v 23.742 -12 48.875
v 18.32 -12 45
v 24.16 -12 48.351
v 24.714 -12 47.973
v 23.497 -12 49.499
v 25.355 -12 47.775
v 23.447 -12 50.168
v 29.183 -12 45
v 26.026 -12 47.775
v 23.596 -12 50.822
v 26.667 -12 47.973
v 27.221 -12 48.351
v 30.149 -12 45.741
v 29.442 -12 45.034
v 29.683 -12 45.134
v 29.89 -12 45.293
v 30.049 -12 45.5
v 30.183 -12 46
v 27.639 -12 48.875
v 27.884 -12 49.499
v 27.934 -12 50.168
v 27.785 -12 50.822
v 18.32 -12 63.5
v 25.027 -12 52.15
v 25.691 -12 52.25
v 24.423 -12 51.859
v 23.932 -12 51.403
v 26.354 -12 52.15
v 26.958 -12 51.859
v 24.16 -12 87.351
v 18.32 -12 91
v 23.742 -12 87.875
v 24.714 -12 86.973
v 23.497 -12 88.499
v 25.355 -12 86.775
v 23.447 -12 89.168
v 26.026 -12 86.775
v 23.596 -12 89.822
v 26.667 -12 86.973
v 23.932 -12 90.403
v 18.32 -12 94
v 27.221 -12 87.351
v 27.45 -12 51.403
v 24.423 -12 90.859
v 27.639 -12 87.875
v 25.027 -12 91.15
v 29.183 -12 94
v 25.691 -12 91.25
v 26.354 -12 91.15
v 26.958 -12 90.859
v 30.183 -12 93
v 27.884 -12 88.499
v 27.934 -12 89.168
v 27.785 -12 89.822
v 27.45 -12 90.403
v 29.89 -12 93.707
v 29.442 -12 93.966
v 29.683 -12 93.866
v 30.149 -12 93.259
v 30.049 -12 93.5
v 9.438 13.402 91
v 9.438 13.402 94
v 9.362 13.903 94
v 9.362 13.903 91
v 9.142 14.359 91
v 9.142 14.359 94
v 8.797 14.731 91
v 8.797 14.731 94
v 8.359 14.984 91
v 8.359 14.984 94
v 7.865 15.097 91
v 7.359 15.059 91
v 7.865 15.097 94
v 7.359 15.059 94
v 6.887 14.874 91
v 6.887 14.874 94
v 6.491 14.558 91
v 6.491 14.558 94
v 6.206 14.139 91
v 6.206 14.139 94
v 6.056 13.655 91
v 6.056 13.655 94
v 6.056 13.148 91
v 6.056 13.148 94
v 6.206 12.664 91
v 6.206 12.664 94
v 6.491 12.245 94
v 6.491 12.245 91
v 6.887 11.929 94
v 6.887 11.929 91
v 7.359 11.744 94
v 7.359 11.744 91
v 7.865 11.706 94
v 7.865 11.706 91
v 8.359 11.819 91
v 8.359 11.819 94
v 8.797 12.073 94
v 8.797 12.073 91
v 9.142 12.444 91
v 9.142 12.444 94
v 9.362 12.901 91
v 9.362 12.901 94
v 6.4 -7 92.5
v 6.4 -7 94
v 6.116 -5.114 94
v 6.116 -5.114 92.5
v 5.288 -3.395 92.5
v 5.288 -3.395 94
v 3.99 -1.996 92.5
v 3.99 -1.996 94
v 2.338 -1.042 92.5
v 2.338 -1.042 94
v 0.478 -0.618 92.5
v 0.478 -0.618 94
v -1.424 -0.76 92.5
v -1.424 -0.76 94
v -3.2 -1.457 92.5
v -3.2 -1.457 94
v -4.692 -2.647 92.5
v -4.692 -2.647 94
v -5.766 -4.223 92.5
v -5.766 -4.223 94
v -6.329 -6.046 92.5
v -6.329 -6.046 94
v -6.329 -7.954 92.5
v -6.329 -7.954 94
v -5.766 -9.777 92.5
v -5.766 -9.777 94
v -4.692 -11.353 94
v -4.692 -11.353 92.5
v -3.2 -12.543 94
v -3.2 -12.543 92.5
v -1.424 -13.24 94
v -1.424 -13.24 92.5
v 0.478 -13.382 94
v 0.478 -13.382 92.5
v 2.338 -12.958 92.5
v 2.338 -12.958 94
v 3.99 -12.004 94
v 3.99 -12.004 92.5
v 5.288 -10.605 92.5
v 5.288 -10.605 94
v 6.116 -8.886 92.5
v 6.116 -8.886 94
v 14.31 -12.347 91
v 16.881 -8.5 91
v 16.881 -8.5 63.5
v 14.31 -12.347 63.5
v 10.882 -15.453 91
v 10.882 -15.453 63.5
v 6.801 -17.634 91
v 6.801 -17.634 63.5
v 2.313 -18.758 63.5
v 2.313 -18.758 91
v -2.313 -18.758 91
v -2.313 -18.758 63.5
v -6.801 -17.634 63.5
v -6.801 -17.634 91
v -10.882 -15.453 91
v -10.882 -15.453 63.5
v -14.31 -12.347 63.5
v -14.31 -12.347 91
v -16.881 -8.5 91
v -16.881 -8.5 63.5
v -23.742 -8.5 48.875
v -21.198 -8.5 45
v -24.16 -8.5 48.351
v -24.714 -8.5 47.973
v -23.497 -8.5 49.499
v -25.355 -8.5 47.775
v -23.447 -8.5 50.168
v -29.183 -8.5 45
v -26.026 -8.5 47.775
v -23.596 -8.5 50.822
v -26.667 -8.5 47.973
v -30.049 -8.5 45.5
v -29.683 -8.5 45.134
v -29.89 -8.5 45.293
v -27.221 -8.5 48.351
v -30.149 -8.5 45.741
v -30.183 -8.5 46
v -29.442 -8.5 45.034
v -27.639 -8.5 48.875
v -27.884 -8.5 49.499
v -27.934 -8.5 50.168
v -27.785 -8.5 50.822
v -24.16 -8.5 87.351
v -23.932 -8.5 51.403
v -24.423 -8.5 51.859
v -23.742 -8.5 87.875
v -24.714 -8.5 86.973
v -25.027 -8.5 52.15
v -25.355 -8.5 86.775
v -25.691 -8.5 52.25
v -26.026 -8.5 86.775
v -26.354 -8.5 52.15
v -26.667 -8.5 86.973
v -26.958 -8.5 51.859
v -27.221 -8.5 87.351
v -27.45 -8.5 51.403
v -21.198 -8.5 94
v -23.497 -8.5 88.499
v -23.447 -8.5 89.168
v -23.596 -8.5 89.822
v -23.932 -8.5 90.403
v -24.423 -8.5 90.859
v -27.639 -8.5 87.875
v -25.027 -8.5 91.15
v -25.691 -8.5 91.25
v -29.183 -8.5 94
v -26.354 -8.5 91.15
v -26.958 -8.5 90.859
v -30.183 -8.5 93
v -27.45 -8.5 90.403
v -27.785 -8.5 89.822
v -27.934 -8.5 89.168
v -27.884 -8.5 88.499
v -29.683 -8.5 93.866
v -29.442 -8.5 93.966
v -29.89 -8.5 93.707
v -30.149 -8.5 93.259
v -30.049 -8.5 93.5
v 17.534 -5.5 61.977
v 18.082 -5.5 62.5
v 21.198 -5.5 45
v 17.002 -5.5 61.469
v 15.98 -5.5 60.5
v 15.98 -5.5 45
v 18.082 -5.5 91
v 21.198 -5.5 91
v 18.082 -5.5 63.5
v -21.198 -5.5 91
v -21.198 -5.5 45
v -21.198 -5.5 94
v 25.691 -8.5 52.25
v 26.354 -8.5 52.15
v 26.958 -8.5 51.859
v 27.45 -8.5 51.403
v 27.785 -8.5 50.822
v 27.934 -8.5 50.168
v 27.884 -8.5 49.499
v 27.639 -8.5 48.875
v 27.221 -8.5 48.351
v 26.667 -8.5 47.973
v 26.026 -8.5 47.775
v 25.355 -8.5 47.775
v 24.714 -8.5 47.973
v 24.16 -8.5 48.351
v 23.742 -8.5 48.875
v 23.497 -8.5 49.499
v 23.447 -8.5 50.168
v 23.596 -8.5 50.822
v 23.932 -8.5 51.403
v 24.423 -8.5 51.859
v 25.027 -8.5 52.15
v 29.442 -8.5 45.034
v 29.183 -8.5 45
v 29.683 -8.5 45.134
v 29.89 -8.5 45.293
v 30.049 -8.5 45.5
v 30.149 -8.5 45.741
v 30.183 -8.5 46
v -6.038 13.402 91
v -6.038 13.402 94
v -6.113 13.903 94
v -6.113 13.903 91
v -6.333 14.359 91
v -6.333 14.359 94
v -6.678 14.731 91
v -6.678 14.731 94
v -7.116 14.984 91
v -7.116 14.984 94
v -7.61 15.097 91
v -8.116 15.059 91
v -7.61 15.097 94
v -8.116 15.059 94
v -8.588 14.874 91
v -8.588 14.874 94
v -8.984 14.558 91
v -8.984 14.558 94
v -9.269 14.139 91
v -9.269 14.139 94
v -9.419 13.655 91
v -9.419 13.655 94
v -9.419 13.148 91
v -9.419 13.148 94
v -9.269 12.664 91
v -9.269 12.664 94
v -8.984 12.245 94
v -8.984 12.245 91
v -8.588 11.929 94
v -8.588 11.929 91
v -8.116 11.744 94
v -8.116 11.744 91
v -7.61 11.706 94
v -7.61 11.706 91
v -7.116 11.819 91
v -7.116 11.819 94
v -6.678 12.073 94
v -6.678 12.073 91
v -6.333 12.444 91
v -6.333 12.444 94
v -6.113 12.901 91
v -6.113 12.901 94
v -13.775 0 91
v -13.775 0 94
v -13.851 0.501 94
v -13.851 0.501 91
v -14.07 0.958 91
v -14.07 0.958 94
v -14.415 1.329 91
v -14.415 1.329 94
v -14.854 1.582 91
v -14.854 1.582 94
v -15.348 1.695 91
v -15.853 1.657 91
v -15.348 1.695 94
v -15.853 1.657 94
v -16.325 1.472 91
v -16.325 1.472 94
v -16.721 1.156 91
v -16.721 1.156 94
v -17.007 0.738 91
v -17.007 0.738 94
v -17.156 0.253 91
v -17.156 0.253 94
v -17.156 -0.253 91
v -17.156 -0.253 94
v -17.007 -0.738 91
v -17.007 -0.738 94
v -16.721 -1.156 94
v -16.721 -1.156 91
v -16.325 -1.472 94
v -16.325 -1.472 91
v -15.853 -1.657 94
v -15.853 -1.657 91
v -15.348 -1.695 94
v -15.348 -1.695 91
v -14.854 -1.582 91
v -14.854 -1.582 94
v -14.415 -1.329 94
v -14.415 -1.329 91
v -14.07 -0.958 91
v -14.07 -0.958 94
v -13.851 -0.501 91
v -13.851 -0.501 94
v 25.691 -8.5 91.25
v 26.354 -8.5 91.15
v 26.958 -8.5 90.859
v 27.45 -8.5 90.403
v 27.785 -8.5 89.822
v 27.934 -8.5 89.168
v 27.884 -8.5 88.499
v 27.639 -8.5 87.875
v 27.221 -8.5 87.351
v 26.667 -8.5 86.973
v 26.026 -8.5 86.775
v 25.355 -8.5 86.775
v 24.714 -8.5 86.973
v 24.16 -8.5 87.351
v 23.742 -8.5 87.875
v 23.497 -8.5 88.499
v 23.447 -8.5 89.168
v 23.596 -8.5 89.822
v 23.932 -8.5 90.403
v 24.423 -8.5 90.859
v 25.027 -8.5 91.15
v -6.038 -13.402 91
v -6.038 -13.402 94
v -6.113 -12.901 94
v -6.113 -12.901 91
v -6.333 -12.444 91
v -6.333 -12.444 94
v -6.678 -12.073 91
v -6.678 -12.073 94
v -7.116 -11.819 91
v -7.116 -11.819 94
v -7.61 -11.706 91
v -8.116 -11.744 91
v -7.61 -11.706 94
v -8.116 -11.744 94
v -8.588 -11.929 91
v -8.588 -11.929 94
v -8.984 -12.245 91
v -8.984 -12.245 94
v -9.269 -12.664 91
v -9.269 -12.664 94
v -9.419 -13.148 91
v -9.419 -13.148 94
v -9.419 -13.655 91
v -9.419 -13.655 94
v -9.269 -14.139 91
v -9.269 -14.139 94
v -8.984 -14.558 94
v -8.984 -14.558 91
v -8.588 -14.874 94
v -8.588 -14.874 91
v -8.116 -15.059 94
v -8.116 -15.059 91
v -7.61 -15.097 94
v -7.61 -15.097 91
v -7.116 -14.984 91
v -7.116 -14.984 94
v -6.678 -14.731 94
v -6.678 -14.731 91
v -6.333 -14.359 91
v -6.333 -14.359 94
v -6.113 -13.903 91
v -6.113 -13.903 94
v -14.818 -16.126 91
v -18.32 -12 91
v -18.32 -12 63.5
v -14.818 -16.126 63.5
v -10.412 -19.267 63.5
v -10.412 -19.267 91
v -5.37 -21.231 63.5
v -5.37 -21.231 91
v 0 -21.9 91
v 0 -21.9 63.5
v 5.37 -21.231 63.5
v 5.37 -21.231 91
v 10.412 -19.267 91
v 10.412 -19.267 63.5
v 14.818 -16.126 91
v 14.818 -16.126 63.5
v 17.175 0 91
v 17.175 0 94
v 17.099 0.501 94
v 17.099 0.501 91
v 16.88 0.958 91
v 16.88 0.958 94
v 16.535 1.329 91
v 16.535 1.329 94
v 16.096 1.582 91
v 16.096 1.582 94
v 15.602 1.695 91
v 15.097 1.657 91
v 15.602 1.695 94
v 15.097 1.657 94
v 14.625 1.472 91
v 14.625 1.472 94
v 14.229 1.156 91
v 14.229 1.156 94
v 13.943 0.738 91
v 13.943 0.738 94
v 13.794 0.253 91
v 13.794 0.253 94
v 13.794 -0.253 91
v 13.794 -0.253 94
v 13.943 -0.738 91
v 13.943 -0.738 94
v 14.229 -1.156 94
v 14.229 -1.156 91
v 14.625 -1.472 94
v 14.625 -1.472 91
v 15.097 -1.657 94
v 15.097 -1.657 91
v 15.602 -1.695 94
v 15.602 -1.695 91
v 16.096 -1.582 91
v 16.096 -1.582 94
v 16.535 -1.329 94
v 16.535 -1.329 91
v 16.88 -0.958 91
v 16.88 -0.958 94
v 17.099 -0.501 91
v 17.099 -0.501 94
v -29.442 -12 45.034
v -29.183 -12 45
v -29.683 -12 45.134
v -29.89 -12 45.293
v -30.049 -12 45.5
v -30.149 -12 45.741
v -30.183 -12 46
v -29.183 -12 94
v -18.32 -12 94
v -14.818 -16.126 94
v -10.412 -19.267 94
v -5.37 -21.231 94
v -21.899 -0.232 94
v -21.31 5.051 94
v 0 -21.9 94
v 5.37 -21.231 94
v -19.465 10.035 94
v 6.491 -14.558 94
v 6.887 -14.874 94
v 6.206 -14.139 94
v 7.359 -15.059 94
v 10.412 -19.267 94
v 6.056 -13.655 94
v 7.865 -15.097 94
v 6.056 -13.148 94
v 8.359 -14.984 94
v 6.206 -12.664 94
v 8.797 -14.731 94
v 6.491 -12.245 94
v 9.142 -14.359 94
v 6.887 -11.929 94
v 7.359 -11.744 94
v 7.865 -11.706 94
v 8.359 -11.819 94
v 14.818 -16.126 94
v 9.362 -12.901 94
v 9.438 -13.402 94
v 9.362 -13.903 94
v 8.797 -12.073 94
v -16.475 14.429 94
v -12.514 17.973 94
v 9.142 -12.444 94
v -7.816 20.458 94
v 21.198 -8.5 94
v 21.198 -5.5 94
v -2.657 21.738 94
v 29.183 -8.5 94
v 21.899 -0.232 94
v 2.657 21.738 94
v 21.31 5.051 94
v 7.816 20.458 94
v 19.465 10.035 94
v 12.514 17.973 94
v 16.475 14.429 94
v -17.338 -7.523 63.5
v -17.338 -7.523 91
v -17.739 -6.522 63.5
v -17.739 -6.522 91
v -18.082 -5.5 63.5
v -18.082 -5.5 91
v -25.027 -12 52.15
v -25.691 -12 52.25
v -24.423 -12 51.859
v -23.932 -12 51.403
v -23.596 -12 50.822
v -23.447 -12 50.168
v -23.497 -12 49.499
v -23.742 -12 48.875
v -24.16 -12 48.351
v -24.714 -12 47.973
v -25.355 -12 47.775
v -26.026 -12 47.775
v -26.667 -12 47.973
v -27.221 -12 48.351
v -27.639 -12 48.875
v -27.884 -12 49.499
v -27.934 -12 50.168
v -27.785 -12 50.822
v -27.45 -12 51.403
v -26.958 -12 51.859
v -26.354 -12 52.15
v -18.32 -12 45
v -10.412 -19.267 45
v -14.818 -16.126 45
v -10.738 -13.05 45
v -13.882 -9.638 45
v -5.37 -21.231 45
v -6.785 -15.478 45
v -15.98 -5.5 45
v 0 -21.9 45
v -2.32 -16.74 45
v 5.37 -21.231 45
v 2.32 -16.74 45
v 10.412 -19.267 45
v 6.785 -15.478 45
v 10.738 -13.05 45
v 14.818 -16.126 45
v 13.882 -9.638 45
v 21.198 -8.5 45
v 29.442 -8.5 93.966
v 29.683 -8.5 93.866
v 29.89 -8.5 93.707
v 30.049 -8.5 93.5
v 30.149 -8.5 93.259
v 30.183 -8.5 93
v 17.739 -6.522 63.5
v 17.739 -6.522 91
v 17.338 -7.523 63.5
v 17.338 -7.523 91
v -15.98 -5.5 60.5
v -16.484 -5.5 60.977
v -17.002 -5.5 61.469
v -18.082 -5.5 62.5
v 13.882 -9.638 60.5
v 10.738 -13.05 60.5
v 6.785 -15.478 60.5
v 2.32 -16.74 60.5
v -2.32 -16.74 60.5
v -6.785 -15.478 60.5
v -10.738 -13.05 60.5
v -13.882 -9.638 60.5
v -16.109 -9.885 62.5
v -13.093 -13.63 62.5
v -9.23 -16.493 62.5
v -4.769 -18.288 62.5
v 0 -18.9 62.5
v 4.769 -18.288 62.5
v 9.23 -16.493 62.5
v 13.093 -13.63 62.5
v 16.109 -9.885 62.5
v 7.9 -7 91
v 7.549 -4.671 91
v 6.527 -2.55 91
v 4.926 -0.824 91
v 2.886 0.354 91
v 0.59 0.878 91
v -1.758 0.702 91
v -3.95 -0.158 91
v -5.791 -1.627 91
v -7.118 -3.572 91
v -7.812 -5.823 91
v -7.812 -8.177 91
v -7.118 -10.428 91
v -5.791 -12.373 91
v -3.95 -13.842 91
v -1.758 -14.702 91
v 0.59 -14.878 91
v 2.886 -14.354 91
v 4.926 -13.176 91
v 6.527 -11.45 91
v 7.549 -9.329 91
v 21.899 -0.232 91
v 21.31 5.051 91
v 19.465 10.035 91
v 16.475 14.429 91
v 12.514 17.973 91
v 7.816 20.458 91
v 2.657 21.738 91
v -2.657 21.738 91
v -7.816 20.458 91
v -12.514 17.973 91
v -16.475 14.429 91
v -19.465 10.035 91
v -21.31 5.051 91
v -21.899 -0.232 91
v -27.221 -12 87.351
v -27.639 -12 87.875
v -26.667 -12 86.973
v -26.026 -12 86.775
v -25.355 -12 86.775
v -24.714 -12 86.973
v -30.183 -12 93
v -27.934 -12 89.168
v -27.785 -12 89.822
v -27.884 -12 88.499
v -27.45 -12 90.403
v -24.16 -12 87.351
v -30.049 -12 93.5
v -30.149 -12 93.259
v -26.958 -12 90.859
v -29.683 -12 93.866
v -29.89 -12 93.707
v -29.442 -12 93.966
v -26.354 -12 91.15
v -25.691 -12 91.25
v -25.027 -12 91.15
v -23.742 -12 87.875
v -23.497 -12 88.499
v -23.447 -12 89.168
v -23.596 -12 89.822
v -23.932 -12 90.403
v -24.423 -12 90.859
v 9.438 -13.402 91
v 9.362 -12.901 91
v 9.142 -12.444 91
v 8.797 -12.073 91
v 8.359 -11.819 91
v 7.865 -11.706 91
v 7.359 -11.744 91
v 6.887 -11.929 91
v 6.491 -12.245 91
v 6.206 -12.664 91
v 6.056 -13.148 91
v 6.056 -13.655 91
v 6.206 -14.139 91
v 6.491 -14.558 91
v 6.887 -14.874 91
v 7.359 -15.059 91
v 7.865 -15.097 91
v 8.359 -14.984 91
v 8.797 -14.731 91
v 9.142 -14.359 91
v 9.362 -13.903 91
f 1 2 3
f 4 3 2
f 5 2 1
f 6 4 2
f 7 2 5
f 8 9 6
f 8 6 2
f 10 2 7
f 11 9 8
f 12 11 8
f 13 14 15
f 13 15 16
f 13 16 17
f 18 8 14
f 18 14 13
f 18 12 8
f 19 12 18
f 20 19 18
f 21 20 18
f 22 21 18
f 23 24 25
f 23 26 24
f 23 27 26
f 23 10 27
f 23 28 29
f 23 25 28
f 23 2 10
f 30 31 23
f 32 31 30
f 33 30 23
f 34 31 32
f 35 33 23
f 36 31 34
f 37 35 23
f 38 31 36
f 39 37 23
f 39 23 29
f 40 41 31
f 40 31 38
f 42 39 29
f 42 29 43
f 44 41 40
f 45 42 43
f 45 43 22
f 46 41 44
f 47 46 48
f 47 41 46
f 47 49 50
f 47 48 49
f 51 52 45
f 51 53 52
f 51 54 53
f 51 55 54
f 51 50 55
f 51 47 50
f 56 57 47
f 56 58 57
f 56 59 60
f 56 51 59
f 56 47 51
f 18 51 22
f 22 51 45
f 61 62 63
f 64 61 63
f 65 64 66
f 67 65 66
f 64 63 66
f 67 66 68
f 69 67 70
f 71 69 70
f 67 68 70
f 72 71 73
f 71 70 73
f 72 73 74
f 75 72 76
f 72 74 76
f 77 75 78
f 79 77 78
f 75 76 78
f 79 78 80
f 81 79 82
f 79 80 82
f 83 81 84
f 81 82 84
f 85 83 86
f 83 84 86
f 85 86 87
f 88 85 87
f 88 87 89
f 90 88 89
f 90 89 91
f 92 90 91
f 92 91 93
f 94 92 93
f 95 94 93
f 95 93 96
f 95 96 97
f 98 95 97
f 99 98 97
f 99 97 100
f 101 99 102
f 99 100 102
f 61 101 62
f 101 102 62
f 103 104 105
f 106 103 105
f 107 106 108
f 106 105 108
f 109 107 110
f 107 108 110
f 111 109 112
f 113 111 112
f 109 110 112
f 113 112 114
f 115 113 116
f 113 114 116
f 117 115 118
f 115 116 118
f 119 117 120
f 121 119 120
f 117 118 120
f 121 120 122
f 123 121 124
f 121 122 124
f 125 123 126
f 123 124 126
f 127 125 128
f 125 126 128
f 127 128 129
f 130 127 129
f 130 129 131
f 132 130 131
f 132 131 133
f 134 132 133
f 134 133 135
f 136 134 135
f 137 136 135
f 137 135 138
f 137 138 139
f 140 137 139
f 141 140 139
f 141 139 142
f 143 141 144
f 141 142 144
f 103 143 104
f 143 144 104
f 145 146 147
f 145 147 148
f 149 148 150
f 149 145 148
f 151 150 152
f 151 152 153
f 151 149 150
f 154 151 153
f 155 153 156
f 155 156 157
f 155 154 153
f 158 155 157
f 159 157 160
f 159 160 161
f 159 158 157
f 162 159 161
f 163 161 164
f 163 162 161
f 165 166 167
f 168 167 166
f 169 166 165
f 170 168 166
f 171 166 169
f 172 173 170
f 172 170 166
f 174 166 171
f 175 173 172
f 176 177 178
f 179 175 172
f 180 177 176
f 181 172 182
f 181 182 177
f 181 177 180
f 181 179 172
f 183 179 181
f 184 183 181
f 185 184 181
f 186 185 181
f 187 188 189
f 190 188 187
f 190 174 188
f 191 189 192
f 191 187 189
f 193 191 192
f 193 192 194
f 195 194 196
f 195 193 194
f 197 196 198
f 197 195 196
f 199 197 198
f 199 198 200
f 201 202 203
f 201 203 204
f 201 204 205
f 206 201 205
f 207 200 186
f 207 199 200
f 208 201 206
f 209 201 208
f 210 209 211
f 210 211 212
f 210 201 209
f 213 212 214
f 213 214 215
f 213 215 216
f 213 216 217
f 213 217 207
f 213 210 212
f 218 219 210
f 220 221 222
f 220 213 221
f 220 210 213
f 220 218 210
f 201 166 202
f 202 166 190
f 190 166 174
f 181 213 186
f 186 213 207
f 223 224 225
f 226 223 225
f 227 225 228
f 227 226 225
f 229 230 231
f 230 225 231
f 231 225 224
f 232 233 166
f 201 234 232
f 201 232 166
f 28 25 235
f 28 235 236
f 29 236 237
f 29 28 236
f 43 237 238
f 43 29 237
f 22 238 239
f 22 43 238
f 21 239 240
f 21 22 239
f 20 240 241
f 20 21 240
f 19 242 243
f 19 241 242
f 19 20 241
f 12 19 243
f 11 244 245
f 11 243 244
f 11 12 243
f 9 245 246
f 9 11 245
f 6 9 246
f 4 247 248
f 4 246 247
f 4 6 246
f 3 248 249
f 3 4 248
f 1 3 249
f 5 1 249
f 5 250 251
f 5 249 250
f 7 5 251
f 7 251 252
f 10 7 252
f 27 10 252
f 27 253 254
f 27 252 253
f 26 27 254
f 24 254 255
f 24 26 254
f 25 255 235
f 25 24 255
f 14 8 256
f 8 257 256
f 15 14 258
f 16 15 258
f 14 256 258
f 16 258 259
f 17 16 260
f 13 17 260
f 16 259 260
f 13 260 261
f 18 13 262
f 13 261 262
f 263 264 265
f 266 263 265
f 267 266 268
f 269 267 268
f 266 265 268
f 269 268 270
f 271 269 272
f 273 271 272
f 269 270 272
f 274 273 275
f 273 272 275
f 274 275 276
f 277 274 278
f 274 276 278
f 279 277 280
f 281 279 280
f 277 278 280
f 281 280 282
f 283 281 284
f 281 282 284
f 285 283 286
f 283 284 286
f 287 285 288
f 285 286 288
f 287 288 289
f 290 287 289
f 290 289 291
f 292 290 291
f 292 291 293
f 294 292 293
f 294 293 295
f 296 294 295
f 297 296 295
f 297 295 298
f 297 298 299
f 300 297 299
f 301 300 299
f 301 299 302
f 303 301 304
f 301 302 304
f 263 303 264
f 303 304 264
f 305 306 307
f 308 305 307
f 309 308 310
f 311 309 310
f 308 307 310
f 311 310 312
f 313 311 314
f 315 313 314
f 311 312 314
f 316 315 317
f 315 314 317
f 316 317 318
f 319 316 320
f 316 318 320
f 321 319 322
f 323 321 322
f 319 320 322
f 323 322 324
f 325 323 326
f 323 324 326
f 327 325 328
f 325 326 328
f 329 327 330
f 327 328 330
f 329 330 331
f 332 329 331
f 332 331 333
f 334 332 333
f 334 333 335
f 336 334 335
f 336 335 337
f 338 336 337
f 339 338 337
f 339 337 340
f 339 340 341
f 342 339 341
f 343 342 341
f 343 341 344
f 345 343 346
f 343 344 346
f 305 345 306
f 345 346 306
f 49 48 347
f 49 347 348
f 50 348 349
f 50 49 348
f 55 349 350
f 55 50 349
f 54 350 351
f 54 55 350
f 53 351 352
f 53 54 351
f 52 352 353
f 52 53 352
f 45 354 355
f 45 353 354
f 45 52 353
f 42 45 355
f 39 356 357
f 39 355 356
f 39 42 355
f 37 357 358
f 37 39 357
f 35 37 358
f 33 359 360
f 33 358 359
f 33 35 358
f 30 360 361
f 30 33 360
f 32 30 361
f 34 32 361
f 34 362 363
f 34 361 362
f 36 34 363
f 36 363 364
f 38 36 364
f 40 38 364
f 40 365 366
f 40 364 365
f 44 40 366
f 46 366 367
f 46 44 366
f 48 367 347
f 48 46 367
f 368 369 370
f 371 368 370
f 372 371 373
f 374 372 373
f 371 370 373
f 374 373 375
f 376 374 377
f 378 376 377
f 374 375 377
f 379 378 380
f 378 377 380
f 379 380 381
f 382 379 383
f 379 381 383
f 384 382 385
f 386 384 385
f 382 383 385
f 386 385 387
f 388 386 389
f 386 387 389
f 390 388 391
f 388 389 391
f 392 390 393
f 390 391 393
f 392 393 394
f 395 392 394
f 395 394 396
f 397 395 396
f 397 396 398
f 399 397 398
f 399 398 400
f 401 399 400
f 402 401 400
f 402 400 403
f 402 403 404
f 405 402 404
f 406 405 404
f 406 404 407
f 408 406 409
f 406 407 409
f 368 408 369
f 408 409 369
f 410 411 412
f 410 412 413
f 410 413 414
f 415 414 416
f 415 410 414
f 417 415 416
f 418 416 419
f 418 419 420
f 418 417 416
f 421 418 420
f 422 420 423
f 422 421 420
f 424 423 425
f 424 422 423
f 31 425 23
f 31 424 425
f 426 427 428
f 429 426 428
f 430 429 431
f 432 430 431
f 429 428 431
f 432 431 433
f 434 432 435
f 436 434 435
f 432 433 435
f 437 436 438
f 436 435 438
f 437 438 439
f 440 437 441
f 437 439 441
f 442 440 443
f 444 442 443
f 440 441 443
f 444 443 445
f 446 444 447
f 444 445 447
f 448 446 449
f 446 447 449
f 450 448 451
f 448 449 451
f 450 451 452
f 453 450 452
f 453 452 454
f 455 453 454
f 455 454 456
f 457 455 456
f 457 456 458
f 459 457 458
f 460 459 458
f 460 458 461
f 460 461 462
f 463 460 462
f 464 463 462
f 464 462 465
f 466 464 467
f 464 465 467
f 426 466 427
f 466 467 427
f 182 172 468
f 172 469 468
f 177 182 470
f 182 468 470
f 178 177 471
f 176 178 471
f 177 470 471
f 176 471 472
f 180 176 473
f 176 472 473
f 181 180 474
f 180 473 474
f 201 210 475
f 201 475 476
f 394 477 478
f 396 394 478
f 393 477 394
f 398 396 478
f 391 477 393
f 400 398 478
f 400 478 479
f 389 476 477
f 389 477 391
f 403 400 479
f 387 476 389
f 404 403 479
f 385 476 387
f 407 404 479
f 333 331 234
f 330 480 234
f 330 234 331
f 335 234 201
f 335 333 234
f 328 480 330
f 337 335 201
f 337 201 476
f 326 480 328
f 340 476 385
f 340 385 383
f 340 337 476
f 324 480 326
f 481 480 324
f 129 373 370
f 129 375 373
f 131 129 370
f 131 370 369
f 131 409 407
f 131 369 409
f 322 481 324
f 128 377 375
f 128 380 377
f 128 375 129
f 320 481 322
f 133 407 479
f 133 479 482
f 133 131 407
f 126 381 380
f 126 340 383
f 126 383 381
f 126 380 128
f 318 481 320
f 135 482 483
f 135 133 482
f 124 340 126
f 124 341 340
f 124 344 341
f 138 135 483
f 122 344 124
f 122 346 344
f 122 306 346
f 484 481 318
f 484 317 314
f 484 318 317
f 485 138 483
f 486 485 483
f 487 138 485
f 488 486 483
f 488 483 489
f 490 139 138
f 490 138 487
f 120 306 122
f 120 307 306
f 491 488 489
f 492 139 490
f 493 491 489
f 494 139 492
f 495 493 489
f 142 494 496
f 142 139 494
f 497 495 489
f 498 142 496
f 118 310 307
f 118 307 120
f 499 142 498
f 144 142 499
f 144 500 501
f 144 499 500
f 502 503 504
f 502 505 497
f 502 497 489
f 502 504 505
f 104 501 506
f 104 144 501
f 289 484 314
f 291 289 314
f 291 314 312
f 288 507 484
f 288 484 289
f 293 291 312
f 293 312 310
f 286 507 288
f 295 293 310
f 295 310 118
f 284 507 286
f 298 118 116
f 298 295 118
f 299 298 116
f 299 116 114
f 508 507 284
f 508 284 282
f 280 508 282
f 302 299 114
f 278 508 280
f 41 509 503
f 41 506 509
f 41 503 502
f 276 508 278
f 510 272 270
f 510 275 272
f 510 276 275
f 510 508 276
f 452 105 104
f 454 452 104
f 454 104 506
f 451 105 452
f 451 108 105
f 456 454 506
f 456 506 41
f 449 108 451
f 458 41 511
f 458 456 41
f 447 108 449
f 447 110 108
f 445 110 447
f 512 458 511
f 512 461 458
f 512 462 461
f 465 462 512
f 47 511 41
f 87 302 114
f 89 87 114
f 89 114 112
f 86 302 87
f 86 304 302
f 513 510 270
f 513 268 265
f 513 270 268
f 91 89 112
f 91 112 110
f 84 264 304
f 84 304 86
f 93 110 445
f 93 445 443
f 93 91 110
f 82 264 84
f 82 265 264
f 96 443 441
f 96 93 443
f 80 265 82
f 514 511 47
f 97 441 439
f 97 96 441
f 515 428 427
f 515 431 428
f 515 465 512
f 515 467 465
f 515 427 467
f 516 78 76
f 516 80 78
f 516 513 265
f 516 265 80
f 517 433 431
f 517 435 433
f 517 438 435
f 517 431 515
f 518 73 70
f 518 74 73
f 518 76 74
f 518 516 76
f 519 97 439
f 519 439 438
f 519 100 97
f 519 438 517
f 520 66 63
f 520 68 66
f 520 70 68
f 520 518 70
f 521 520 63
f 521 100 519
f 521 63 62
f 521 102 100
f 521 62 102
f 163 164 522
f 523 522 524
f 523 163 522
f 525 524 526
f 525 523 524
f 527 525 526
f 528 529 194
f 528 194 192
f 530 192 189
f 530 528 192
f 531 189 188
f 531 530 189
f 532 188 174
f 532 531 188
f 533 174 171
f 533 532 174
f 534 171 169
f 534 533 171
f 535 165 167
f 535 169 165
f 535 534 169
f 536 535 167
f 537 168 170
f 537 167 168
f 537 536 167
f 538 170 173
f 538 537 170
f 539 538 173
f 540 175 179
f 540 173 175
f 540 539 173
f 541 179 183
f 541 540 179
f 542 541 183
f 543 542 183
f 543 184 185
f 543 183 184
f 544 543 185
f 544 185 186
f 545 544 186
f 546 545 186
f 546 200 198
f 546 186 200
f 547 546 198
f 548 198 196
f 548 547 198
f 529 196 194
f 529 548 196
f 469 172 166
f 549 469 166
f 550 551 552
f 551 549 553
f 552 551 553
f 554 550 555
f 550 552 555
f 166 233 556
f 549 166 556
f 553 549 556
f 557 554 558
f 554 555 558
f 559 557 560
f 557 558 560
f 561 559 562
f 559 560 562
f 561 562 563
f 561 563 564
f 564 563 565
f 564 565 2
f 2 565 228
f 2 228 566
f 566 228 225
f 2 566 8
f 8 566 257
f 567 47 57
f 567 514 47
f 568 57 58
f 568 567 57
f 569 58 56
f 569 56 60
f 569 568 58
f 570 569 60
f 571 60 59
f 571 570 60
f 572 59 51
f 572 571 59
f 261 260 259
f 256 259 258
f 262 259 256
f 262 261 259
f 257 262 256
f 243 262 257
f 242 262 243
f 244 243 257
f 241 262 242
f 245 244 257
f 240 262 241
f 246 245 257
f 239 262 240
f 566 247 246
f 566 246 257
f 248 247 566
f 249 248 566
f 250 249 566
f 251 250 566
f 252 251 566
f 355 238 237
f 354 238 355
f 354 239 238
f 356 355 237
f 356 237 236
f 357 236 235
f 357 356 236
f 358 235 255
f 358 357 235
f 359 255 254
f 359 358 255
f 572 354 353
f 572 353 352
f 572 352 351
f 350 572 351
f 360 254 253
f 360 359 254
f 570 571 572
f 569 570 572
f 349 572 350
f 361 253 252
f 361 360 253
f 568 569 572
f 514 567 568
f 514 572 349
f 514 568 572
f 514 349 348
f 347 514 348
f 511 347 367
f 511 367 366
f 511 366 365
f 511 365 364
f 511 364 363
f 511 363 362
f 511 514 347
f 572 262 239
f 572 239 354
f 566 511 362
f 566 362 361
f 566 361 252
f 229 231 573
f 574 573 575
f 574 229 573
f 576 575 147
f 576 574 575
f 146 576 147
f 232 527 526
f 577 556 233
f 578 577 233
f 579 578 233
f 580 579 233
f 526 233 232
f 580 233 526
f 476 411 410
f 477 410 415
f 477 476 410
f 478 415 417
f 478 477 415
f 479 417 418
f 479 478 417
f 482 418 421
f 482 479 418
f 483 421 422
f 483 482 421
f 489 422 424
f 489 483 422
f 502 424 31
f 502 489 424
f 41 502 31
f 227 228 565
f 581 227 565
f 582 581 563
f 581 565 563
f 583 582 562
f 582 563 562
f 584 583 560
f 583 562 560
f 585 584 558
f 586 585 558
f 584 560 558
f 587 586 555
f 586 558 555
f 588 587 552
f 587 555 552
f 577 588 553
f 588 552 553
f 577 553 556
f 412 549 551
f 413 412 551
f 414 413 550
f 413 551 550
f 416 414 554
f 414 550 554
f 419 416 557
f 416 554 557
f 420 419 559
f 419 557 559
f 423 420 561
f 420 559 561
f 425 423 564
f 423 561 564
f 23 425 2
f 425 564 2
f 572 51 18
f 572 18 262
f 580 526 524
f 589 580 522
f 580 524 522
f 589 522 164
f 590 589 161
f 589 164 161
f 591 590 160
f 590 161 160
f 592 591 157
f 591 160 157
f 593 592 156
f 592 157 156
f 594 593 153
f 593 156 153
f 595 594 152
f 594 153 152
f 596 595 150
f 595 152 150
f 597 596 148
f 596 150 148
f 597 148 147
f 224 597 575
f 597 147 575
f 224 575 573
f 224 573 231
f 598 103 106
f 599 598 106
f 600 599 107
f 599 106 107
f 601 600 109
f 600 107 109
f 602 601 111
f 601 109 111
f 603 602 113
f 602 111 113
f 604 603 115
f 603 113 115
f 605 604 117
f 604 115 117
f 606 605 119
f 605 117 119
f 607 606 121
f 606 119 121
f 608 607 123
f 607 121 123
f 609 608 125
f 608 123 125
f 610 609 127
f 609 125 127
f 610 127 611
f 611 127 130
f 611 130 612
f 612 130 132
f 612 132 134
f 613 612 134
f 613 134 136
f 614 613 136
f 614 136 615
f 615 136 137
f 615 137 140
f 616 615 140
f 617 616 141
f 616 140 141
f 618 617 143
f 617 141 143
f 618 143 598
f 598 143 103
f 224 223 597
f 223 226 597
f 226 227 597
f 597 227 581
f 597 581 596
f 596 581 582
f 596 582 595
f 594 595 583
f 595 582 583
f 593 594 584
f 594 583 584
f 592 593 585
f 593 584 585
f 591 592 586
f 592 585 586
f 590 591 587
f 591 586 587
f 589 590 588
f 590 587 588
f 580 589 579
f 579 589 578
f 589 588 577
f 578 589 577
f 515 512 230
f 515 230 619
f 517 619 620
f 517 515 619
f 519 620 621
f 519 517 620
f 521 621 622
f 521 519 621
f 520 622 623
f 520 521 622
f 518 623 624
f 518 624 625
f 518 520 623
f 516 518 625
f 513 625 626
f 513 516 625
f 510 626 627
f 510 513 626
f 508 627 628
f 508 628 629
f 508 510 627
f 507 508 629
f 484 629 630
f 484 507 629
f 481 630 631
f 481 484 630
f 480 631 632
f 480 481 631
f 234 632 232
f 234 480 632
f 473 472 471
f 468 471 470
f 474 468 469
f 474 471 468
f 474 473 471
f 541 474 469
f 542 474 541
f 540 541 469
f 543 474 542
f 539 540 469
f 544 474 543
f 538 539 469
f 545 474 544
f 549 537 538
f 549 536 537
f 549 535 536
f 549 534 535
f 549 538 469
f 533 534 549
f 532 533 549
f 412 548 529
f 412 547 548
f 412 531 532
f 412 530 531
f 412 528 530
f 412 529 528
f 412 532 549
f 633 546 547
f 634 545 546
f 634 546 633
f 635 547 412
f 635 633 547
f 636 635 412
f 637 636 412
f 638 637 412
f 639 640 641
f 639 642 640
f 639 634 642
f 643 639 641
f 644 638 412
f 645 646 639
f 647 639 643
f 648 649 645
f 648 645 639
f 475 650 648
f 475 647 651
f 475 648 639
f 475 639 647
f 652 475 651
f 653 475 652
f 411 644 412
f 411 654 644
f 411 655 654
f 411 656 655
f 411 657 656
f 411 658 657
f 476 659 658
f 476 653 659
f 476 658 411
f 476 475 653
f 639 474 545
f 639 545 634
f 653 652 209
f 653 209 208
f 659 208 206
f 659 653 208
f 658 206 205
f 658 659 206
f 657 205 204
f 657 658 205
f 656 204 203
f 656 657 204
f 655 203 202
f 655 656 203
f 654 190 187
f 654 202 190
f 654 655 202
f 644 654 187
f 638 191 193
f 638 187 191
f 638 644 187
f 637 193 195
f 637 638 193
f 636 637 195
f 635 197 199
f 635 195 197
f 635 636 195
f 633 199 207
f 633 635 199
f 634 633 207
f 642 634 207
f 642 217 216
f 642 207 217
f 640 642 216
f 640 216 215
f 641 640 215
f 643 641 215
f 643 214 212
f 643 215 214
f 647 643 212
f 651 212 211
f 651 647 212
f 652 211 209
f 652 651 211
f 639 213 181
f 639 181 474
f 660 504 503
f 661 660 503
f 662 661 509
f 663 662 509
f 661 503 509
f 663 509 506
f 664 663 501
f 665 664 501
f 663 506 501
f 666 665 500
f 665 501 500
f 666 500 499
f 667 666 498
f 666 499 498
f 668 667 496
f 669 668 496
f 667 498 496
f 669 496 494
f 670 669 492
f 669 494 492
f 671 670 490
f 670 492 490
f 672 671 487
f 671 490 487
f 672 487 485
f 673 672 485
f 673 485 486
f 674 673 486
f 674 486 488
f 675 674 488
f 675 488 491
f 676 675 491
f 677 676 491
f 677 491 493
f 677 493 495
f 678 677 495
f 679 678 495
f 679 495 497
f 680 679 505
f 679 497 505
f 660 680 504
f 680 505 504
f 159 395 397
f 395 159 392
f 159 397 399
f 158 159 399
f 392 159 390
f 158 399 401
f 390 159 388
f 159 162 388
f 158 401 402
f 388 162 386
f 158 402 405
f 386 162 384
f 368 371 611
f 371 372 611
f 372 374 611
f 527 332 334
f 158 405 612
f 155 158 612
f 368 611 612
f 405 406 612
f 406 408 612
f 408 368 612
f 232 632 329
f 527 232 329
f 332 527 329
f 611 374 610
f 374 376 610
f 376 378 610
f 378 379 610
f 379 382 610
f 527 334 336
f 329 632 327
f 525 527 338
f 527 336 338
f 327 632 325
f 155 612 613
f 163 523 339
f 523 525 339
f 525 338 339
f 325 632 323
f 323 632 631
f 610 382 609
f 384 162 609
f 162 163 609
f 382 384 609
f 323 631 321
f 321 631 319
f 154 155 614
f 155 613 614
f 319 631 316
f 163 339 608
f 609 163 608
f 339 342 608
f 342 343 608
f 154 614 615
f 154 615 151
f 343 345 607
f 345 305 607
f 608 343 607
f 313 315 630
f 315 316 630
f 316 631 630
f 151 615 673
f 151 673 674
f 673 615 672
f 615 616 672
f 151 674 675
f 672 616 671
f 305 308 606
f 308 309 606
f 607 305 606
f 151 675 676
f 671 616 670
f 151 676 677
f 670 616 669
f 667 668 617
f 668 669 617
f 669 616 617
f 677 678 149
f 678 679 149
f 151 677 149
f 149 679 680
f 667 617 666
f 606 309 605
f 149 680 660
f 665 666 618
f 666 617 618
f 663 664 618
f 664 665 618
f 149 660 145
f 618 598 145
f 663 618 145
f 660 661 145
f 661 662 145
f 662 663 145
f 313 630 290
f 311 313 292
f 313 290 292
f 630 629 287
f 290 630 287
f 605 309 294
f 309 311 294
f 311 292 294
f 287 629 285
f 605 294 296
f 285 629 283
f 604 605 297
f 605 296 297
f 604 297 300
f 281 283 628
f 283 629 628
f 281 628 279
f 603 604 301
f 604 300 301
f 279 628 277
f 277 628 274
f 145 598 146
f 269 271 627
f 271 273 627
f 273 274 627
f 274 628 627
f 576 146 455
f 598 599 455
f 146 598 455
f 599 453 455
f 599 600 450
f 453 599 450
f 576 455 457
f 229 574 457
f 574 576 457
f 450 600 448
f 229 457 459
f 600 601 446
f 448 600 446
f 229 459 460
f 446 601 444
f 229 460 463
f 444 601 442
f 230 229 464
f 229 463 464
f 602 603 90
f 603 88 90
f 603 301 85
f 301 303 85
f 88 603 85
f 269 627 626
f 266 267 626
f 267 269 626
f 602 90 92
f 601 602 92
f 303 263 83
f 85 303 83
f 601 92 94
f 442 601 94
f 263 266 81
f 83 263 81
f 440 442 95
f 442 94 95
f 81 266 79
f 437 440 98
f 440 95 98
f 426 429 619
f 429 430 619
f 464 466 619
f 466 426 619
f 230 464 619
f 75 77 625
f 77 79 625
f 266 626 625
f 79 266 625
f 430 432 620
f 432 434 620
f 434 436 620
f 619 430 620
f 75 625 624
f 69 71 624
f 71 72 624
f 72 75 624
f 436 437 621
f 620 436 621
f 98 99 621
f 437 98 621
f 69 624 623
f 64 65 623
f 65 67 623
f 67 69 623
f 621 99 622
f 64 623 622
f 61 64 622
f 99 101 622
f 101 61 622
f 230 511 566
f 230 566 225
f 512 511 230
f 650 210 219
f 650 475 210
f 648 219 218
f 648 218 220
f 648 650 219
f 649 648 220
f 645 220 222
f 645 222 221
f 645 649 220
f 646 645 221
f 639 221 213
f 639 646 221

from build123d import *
from build123d.topology import SkipClean

# Parameters (mm, degrees)
BOSS_EXTRUDE1_START     = 94
SKETCH1_R               = 21.9
SKETCH1_R_2             = 1.7
SKETCH1_R_3             = 6.4
BOSS_EXTRUDE1_DEPTH     = 3
BOSS_EXTRUDE2_START     = 91
BOSS_EXTRUDE2_DEPTH     = 27.5
BOSS_EXTRUDE3_START     = 45
BOSS_EXTRUDE3_DEPTH     = 18.5
BOSS_EXTRUDE7_START     = 94
BOSS_EXTRUDE7_DEPTH     = 49
CUT_EXTRUDE5_DEPTH      = 104.301419283
CUT_EXTRUDE5_DEPTH_BACK = 104.301419283
SKETCH4_R               = 2.25
CHAMFER3_SIZE           = 3
CHAMFER4_SIZE           = 1.5
FILLET2_R               = 1


with BuildPart() as part:
    # Sketch1 → Boss-Extrude1 (new body)
    with BuildSketch(Plane.XY.offset(BOSS_EXTRUDE1_START)):
        Circle(SKETCH1_R)
        with Locations((15.475, 0)):
            Circle(SKETCH1_R_2, mode=Mode.SUBTRACT)
        with Locations((7.7375, -13.401743124)):
            Circle(SKETCH1_R_2, mode=Mode.SUBTRACT)
        with Locations((-7.7375, -13.401743124)):
            Circle(SKETCH1_R_2, mode=Mode.SUBTRACT)
        with Locations((-15.475, 0)):
            Circle(SKETCH1_R_2, mode=Mode.SUBTRACT)
        with Locations((-7.7375, 13.401743124)):
            Circle(SKETCH1_R_2, mode=Mode.SUBTRACT)
        with Locations((7.7375, 13.401743124)):
            Circle(SKETCH1_R_2, mode=Mode.SUBTRACT)
        with Locations((0, -7)):
            Circle(SKETCH1_R_3, mode=Mode.SUBTRACT)
    extrude(amount=-BOSS_EXTRUDE1_DEPTH)

    # Sketch1<5> → Boss-Extrude2 (add)
    with BuildSketch(Plane.XY.offset(BOSS_EXTRUDE2_START)):
        with BuildLine():
            ThreePointArc((18.319661569, -12), (19.330787418, -10.292262036), (20.183161298, -8.5))
            Line((20.183161298, -8.5), (16.880758277, -8.5))
            ThreePointArc((16.880758277, -8.5), (0, -18.9), (-16.880758277, -8.5))
            Line((-16.880758277, -8.5), (-20.183161298, -8.5))
            ThreePointArc((-20.183161298, -8.5), (-19.330787418, -10.292262036), (-18.319661569, -12))
            ThreePointArc((-18.319661569, -12), (0, -21.9), (18.319661569, -12))
        make_face()
        with BuildLine():
            Line((-20.183161298, -8.5), (-16.880758277, -8.5))
            ThreePointArc((-16.880758277, -8.5), (-17.545632887, -7.025721786), (-18.082035284, -5.5))
            Line((-18.082035284, -5.5), (-21.198113124, -5.5))
            ThreePointArc((-21.198113124, -5.5), (-20.744938375, -7.018371022), (-20.183161298, -8.5))
        make_face()
        with BuildLine():
            Line((16.880758277, -8.5), (20.183161298, -8.5))
            ThreePointArc((20.183161298, -8.5), (20.744938375, -7.018371022), (21.198113124, -5.5))
            Line((21.198113124, -5.5), (18.082035284, -5.5))
            ThreePointArc((18.082035284, -5.5), (17.545632887, -7.025721786), (16.880758277, -8.5))
        make_face()
    extrude(amount=-BOSS_EXTRUDE2_DEPTH)

    # Sketch1<6> → Boss-Extrude3 (add)
    with SkipClean():  # the faces are left unmerged after this step: merging them gives an invalid solid
        with BuildSketch(Plane.XY.offset(BOSS_EXTRUDE3_START)):
            with BuildLine():
                Line((21.198113124, -5.5), (15.979987484, -5.5))
                ThreePointArc((15.979987484, -5.5), (0, -16.9), (-15.979987484, -5.5))
                Line((-15.979987484, -5.5), (-21.198113124, -5.5))
                ThreePointArc((-21.198113124, -5.5), (0, -21.9), (21.198113124, -5.5))
            make_face()
        extrude(amount=BOSS_EXTRUDE3_DEPTH)

    # Sketch1<11> → Boss-Extrude7 (add)
    with SkipClean():  # the faces are left unmerged after this step: merging them gives an invalid solid
        with BuildSketch(Plane.XY.offset(BOSS_EXTRUDE7_START)):
            with BuildLine():
                ThreePointArc((21.198113124, -5.5), (20.024388359, -8.867574124), (18.319661569, -12))
                Line((18.319661569, -12), (30.183161298, -12))
                Line((30.183161298, -12), (30.183161298, -8.5))
                Line((30.183161298, -8.5), (21.198113124, -8.5))
                Line((21.198113124, -8.5), (21.198113124, -5.5))
            make_face()
            with BuildLine():
                Line((-30.183161298, -12), (-18.319661569, -12))
                ThreePointArc((-18.319661569, -12), (-20.024388359, -8.867574124), (-21.198113124, -5.5))
                Line((-21.198113124, -5.5), (-21.198113124, -8.5))
                Line((-21.198113124, -8.5), (-30.183161298, -8.5))
                Line((-30.183161298, -8.5), (-30.183161298, -12))
            make_face()
        extrude(amount=-BOSS_EXTRUDE7_DEPTH)

    # Sketch4 → Cut-Extrude5 (cut, two sides: drawn at the far end of the back side and taken through both)
    with SkipClean():  # the faces are left unmerged after this step: merging them gives an invalid solid
        with BuildSketch(Plane(origin=(0, -8.5, 0), x_dir=(1, 0, 0), z_dir=(0, 1, 0)).offset(-CUT_EXTRUDE5_DEPTH_BACK)):
            with Locations(Location((-25.690637211, -50, 0), (0, 0, 270))):
                Circle(SKETCH4_R)
            with Locations(Location((-25.690637211, -89, 0), (0, 0, 270))):
                Circle(SKETCH4_R)
            with Locations(Location((25.690637211, -50, 0), (0, 0, 270))):
                Circle(SKETCH4_R)
            with Locations(Location((25.690637211, -89, 0), (0, 0, 270))):
                Circle(SKETCH4_R)
        extrude(amount=CUT_EXTRUDE5_DEPTH + CUT_EXTRUDE5_DEPTH_BACK, mode=Mode.SUBTRACT)

    # Chamfer3
    # the kernel refuses this chamfer: 3 mm, written as the material it takes off along each edge
    with BuildSketch(Plane(origin=(0, 0, 63.5), x_dir=(0.9921367643584464, 0.1251584627915844, 0), z_dir=(-0.1251584627915844, 0.9921367643584464, 0))) as chamfer3_piece_1_section:
        Polygon((16.9 + CHAMFER3_SIZE, 0), (16.9, CHAMFER3_SIZE), (16.9, 0), align=None)
    chamfer3_piece_1 = revolve(axis=Axis((0, 0, 63.5), (0, 0, -1)), revolution_arc=194.379813793, mode=Mode.PRIVATE)
    chamfer3_piece_1 = chamfer3_piece_1 & Plane(origin=(0, 0, 61.502732277), x_dir=(0.8931618135876879, -0.4497354497354555, 0), z_dir=(0, 0, 1)) * Cylinder(18.9, 80, mode=Mode.PRIVATE)
    add(chamfer3_piece_1, mode=Mode.SUBTRACT)

    # Chamfer4
    chamfer4_edges = [part.edges().sort_by_distance(p)[0] for p in [
        (-6.4, -7, 91),
    ]]
    chamfer(chamfer4_edges, length=CHAMFER4_SIZE)

    # Fillet2
    fillet2_edges = [part.edges().sort_by_distance(p)[0] for p in [
        (-30.183161298, -10.25, 45),
        (-30.183161298, -10.25, 94),
        (30.183161298, -10.25, 45),
        (30.183161298, -10.25, 94),
    ]]
    fillet(fillet2_edges, radius=FILLET2_R)


solid = part.part
